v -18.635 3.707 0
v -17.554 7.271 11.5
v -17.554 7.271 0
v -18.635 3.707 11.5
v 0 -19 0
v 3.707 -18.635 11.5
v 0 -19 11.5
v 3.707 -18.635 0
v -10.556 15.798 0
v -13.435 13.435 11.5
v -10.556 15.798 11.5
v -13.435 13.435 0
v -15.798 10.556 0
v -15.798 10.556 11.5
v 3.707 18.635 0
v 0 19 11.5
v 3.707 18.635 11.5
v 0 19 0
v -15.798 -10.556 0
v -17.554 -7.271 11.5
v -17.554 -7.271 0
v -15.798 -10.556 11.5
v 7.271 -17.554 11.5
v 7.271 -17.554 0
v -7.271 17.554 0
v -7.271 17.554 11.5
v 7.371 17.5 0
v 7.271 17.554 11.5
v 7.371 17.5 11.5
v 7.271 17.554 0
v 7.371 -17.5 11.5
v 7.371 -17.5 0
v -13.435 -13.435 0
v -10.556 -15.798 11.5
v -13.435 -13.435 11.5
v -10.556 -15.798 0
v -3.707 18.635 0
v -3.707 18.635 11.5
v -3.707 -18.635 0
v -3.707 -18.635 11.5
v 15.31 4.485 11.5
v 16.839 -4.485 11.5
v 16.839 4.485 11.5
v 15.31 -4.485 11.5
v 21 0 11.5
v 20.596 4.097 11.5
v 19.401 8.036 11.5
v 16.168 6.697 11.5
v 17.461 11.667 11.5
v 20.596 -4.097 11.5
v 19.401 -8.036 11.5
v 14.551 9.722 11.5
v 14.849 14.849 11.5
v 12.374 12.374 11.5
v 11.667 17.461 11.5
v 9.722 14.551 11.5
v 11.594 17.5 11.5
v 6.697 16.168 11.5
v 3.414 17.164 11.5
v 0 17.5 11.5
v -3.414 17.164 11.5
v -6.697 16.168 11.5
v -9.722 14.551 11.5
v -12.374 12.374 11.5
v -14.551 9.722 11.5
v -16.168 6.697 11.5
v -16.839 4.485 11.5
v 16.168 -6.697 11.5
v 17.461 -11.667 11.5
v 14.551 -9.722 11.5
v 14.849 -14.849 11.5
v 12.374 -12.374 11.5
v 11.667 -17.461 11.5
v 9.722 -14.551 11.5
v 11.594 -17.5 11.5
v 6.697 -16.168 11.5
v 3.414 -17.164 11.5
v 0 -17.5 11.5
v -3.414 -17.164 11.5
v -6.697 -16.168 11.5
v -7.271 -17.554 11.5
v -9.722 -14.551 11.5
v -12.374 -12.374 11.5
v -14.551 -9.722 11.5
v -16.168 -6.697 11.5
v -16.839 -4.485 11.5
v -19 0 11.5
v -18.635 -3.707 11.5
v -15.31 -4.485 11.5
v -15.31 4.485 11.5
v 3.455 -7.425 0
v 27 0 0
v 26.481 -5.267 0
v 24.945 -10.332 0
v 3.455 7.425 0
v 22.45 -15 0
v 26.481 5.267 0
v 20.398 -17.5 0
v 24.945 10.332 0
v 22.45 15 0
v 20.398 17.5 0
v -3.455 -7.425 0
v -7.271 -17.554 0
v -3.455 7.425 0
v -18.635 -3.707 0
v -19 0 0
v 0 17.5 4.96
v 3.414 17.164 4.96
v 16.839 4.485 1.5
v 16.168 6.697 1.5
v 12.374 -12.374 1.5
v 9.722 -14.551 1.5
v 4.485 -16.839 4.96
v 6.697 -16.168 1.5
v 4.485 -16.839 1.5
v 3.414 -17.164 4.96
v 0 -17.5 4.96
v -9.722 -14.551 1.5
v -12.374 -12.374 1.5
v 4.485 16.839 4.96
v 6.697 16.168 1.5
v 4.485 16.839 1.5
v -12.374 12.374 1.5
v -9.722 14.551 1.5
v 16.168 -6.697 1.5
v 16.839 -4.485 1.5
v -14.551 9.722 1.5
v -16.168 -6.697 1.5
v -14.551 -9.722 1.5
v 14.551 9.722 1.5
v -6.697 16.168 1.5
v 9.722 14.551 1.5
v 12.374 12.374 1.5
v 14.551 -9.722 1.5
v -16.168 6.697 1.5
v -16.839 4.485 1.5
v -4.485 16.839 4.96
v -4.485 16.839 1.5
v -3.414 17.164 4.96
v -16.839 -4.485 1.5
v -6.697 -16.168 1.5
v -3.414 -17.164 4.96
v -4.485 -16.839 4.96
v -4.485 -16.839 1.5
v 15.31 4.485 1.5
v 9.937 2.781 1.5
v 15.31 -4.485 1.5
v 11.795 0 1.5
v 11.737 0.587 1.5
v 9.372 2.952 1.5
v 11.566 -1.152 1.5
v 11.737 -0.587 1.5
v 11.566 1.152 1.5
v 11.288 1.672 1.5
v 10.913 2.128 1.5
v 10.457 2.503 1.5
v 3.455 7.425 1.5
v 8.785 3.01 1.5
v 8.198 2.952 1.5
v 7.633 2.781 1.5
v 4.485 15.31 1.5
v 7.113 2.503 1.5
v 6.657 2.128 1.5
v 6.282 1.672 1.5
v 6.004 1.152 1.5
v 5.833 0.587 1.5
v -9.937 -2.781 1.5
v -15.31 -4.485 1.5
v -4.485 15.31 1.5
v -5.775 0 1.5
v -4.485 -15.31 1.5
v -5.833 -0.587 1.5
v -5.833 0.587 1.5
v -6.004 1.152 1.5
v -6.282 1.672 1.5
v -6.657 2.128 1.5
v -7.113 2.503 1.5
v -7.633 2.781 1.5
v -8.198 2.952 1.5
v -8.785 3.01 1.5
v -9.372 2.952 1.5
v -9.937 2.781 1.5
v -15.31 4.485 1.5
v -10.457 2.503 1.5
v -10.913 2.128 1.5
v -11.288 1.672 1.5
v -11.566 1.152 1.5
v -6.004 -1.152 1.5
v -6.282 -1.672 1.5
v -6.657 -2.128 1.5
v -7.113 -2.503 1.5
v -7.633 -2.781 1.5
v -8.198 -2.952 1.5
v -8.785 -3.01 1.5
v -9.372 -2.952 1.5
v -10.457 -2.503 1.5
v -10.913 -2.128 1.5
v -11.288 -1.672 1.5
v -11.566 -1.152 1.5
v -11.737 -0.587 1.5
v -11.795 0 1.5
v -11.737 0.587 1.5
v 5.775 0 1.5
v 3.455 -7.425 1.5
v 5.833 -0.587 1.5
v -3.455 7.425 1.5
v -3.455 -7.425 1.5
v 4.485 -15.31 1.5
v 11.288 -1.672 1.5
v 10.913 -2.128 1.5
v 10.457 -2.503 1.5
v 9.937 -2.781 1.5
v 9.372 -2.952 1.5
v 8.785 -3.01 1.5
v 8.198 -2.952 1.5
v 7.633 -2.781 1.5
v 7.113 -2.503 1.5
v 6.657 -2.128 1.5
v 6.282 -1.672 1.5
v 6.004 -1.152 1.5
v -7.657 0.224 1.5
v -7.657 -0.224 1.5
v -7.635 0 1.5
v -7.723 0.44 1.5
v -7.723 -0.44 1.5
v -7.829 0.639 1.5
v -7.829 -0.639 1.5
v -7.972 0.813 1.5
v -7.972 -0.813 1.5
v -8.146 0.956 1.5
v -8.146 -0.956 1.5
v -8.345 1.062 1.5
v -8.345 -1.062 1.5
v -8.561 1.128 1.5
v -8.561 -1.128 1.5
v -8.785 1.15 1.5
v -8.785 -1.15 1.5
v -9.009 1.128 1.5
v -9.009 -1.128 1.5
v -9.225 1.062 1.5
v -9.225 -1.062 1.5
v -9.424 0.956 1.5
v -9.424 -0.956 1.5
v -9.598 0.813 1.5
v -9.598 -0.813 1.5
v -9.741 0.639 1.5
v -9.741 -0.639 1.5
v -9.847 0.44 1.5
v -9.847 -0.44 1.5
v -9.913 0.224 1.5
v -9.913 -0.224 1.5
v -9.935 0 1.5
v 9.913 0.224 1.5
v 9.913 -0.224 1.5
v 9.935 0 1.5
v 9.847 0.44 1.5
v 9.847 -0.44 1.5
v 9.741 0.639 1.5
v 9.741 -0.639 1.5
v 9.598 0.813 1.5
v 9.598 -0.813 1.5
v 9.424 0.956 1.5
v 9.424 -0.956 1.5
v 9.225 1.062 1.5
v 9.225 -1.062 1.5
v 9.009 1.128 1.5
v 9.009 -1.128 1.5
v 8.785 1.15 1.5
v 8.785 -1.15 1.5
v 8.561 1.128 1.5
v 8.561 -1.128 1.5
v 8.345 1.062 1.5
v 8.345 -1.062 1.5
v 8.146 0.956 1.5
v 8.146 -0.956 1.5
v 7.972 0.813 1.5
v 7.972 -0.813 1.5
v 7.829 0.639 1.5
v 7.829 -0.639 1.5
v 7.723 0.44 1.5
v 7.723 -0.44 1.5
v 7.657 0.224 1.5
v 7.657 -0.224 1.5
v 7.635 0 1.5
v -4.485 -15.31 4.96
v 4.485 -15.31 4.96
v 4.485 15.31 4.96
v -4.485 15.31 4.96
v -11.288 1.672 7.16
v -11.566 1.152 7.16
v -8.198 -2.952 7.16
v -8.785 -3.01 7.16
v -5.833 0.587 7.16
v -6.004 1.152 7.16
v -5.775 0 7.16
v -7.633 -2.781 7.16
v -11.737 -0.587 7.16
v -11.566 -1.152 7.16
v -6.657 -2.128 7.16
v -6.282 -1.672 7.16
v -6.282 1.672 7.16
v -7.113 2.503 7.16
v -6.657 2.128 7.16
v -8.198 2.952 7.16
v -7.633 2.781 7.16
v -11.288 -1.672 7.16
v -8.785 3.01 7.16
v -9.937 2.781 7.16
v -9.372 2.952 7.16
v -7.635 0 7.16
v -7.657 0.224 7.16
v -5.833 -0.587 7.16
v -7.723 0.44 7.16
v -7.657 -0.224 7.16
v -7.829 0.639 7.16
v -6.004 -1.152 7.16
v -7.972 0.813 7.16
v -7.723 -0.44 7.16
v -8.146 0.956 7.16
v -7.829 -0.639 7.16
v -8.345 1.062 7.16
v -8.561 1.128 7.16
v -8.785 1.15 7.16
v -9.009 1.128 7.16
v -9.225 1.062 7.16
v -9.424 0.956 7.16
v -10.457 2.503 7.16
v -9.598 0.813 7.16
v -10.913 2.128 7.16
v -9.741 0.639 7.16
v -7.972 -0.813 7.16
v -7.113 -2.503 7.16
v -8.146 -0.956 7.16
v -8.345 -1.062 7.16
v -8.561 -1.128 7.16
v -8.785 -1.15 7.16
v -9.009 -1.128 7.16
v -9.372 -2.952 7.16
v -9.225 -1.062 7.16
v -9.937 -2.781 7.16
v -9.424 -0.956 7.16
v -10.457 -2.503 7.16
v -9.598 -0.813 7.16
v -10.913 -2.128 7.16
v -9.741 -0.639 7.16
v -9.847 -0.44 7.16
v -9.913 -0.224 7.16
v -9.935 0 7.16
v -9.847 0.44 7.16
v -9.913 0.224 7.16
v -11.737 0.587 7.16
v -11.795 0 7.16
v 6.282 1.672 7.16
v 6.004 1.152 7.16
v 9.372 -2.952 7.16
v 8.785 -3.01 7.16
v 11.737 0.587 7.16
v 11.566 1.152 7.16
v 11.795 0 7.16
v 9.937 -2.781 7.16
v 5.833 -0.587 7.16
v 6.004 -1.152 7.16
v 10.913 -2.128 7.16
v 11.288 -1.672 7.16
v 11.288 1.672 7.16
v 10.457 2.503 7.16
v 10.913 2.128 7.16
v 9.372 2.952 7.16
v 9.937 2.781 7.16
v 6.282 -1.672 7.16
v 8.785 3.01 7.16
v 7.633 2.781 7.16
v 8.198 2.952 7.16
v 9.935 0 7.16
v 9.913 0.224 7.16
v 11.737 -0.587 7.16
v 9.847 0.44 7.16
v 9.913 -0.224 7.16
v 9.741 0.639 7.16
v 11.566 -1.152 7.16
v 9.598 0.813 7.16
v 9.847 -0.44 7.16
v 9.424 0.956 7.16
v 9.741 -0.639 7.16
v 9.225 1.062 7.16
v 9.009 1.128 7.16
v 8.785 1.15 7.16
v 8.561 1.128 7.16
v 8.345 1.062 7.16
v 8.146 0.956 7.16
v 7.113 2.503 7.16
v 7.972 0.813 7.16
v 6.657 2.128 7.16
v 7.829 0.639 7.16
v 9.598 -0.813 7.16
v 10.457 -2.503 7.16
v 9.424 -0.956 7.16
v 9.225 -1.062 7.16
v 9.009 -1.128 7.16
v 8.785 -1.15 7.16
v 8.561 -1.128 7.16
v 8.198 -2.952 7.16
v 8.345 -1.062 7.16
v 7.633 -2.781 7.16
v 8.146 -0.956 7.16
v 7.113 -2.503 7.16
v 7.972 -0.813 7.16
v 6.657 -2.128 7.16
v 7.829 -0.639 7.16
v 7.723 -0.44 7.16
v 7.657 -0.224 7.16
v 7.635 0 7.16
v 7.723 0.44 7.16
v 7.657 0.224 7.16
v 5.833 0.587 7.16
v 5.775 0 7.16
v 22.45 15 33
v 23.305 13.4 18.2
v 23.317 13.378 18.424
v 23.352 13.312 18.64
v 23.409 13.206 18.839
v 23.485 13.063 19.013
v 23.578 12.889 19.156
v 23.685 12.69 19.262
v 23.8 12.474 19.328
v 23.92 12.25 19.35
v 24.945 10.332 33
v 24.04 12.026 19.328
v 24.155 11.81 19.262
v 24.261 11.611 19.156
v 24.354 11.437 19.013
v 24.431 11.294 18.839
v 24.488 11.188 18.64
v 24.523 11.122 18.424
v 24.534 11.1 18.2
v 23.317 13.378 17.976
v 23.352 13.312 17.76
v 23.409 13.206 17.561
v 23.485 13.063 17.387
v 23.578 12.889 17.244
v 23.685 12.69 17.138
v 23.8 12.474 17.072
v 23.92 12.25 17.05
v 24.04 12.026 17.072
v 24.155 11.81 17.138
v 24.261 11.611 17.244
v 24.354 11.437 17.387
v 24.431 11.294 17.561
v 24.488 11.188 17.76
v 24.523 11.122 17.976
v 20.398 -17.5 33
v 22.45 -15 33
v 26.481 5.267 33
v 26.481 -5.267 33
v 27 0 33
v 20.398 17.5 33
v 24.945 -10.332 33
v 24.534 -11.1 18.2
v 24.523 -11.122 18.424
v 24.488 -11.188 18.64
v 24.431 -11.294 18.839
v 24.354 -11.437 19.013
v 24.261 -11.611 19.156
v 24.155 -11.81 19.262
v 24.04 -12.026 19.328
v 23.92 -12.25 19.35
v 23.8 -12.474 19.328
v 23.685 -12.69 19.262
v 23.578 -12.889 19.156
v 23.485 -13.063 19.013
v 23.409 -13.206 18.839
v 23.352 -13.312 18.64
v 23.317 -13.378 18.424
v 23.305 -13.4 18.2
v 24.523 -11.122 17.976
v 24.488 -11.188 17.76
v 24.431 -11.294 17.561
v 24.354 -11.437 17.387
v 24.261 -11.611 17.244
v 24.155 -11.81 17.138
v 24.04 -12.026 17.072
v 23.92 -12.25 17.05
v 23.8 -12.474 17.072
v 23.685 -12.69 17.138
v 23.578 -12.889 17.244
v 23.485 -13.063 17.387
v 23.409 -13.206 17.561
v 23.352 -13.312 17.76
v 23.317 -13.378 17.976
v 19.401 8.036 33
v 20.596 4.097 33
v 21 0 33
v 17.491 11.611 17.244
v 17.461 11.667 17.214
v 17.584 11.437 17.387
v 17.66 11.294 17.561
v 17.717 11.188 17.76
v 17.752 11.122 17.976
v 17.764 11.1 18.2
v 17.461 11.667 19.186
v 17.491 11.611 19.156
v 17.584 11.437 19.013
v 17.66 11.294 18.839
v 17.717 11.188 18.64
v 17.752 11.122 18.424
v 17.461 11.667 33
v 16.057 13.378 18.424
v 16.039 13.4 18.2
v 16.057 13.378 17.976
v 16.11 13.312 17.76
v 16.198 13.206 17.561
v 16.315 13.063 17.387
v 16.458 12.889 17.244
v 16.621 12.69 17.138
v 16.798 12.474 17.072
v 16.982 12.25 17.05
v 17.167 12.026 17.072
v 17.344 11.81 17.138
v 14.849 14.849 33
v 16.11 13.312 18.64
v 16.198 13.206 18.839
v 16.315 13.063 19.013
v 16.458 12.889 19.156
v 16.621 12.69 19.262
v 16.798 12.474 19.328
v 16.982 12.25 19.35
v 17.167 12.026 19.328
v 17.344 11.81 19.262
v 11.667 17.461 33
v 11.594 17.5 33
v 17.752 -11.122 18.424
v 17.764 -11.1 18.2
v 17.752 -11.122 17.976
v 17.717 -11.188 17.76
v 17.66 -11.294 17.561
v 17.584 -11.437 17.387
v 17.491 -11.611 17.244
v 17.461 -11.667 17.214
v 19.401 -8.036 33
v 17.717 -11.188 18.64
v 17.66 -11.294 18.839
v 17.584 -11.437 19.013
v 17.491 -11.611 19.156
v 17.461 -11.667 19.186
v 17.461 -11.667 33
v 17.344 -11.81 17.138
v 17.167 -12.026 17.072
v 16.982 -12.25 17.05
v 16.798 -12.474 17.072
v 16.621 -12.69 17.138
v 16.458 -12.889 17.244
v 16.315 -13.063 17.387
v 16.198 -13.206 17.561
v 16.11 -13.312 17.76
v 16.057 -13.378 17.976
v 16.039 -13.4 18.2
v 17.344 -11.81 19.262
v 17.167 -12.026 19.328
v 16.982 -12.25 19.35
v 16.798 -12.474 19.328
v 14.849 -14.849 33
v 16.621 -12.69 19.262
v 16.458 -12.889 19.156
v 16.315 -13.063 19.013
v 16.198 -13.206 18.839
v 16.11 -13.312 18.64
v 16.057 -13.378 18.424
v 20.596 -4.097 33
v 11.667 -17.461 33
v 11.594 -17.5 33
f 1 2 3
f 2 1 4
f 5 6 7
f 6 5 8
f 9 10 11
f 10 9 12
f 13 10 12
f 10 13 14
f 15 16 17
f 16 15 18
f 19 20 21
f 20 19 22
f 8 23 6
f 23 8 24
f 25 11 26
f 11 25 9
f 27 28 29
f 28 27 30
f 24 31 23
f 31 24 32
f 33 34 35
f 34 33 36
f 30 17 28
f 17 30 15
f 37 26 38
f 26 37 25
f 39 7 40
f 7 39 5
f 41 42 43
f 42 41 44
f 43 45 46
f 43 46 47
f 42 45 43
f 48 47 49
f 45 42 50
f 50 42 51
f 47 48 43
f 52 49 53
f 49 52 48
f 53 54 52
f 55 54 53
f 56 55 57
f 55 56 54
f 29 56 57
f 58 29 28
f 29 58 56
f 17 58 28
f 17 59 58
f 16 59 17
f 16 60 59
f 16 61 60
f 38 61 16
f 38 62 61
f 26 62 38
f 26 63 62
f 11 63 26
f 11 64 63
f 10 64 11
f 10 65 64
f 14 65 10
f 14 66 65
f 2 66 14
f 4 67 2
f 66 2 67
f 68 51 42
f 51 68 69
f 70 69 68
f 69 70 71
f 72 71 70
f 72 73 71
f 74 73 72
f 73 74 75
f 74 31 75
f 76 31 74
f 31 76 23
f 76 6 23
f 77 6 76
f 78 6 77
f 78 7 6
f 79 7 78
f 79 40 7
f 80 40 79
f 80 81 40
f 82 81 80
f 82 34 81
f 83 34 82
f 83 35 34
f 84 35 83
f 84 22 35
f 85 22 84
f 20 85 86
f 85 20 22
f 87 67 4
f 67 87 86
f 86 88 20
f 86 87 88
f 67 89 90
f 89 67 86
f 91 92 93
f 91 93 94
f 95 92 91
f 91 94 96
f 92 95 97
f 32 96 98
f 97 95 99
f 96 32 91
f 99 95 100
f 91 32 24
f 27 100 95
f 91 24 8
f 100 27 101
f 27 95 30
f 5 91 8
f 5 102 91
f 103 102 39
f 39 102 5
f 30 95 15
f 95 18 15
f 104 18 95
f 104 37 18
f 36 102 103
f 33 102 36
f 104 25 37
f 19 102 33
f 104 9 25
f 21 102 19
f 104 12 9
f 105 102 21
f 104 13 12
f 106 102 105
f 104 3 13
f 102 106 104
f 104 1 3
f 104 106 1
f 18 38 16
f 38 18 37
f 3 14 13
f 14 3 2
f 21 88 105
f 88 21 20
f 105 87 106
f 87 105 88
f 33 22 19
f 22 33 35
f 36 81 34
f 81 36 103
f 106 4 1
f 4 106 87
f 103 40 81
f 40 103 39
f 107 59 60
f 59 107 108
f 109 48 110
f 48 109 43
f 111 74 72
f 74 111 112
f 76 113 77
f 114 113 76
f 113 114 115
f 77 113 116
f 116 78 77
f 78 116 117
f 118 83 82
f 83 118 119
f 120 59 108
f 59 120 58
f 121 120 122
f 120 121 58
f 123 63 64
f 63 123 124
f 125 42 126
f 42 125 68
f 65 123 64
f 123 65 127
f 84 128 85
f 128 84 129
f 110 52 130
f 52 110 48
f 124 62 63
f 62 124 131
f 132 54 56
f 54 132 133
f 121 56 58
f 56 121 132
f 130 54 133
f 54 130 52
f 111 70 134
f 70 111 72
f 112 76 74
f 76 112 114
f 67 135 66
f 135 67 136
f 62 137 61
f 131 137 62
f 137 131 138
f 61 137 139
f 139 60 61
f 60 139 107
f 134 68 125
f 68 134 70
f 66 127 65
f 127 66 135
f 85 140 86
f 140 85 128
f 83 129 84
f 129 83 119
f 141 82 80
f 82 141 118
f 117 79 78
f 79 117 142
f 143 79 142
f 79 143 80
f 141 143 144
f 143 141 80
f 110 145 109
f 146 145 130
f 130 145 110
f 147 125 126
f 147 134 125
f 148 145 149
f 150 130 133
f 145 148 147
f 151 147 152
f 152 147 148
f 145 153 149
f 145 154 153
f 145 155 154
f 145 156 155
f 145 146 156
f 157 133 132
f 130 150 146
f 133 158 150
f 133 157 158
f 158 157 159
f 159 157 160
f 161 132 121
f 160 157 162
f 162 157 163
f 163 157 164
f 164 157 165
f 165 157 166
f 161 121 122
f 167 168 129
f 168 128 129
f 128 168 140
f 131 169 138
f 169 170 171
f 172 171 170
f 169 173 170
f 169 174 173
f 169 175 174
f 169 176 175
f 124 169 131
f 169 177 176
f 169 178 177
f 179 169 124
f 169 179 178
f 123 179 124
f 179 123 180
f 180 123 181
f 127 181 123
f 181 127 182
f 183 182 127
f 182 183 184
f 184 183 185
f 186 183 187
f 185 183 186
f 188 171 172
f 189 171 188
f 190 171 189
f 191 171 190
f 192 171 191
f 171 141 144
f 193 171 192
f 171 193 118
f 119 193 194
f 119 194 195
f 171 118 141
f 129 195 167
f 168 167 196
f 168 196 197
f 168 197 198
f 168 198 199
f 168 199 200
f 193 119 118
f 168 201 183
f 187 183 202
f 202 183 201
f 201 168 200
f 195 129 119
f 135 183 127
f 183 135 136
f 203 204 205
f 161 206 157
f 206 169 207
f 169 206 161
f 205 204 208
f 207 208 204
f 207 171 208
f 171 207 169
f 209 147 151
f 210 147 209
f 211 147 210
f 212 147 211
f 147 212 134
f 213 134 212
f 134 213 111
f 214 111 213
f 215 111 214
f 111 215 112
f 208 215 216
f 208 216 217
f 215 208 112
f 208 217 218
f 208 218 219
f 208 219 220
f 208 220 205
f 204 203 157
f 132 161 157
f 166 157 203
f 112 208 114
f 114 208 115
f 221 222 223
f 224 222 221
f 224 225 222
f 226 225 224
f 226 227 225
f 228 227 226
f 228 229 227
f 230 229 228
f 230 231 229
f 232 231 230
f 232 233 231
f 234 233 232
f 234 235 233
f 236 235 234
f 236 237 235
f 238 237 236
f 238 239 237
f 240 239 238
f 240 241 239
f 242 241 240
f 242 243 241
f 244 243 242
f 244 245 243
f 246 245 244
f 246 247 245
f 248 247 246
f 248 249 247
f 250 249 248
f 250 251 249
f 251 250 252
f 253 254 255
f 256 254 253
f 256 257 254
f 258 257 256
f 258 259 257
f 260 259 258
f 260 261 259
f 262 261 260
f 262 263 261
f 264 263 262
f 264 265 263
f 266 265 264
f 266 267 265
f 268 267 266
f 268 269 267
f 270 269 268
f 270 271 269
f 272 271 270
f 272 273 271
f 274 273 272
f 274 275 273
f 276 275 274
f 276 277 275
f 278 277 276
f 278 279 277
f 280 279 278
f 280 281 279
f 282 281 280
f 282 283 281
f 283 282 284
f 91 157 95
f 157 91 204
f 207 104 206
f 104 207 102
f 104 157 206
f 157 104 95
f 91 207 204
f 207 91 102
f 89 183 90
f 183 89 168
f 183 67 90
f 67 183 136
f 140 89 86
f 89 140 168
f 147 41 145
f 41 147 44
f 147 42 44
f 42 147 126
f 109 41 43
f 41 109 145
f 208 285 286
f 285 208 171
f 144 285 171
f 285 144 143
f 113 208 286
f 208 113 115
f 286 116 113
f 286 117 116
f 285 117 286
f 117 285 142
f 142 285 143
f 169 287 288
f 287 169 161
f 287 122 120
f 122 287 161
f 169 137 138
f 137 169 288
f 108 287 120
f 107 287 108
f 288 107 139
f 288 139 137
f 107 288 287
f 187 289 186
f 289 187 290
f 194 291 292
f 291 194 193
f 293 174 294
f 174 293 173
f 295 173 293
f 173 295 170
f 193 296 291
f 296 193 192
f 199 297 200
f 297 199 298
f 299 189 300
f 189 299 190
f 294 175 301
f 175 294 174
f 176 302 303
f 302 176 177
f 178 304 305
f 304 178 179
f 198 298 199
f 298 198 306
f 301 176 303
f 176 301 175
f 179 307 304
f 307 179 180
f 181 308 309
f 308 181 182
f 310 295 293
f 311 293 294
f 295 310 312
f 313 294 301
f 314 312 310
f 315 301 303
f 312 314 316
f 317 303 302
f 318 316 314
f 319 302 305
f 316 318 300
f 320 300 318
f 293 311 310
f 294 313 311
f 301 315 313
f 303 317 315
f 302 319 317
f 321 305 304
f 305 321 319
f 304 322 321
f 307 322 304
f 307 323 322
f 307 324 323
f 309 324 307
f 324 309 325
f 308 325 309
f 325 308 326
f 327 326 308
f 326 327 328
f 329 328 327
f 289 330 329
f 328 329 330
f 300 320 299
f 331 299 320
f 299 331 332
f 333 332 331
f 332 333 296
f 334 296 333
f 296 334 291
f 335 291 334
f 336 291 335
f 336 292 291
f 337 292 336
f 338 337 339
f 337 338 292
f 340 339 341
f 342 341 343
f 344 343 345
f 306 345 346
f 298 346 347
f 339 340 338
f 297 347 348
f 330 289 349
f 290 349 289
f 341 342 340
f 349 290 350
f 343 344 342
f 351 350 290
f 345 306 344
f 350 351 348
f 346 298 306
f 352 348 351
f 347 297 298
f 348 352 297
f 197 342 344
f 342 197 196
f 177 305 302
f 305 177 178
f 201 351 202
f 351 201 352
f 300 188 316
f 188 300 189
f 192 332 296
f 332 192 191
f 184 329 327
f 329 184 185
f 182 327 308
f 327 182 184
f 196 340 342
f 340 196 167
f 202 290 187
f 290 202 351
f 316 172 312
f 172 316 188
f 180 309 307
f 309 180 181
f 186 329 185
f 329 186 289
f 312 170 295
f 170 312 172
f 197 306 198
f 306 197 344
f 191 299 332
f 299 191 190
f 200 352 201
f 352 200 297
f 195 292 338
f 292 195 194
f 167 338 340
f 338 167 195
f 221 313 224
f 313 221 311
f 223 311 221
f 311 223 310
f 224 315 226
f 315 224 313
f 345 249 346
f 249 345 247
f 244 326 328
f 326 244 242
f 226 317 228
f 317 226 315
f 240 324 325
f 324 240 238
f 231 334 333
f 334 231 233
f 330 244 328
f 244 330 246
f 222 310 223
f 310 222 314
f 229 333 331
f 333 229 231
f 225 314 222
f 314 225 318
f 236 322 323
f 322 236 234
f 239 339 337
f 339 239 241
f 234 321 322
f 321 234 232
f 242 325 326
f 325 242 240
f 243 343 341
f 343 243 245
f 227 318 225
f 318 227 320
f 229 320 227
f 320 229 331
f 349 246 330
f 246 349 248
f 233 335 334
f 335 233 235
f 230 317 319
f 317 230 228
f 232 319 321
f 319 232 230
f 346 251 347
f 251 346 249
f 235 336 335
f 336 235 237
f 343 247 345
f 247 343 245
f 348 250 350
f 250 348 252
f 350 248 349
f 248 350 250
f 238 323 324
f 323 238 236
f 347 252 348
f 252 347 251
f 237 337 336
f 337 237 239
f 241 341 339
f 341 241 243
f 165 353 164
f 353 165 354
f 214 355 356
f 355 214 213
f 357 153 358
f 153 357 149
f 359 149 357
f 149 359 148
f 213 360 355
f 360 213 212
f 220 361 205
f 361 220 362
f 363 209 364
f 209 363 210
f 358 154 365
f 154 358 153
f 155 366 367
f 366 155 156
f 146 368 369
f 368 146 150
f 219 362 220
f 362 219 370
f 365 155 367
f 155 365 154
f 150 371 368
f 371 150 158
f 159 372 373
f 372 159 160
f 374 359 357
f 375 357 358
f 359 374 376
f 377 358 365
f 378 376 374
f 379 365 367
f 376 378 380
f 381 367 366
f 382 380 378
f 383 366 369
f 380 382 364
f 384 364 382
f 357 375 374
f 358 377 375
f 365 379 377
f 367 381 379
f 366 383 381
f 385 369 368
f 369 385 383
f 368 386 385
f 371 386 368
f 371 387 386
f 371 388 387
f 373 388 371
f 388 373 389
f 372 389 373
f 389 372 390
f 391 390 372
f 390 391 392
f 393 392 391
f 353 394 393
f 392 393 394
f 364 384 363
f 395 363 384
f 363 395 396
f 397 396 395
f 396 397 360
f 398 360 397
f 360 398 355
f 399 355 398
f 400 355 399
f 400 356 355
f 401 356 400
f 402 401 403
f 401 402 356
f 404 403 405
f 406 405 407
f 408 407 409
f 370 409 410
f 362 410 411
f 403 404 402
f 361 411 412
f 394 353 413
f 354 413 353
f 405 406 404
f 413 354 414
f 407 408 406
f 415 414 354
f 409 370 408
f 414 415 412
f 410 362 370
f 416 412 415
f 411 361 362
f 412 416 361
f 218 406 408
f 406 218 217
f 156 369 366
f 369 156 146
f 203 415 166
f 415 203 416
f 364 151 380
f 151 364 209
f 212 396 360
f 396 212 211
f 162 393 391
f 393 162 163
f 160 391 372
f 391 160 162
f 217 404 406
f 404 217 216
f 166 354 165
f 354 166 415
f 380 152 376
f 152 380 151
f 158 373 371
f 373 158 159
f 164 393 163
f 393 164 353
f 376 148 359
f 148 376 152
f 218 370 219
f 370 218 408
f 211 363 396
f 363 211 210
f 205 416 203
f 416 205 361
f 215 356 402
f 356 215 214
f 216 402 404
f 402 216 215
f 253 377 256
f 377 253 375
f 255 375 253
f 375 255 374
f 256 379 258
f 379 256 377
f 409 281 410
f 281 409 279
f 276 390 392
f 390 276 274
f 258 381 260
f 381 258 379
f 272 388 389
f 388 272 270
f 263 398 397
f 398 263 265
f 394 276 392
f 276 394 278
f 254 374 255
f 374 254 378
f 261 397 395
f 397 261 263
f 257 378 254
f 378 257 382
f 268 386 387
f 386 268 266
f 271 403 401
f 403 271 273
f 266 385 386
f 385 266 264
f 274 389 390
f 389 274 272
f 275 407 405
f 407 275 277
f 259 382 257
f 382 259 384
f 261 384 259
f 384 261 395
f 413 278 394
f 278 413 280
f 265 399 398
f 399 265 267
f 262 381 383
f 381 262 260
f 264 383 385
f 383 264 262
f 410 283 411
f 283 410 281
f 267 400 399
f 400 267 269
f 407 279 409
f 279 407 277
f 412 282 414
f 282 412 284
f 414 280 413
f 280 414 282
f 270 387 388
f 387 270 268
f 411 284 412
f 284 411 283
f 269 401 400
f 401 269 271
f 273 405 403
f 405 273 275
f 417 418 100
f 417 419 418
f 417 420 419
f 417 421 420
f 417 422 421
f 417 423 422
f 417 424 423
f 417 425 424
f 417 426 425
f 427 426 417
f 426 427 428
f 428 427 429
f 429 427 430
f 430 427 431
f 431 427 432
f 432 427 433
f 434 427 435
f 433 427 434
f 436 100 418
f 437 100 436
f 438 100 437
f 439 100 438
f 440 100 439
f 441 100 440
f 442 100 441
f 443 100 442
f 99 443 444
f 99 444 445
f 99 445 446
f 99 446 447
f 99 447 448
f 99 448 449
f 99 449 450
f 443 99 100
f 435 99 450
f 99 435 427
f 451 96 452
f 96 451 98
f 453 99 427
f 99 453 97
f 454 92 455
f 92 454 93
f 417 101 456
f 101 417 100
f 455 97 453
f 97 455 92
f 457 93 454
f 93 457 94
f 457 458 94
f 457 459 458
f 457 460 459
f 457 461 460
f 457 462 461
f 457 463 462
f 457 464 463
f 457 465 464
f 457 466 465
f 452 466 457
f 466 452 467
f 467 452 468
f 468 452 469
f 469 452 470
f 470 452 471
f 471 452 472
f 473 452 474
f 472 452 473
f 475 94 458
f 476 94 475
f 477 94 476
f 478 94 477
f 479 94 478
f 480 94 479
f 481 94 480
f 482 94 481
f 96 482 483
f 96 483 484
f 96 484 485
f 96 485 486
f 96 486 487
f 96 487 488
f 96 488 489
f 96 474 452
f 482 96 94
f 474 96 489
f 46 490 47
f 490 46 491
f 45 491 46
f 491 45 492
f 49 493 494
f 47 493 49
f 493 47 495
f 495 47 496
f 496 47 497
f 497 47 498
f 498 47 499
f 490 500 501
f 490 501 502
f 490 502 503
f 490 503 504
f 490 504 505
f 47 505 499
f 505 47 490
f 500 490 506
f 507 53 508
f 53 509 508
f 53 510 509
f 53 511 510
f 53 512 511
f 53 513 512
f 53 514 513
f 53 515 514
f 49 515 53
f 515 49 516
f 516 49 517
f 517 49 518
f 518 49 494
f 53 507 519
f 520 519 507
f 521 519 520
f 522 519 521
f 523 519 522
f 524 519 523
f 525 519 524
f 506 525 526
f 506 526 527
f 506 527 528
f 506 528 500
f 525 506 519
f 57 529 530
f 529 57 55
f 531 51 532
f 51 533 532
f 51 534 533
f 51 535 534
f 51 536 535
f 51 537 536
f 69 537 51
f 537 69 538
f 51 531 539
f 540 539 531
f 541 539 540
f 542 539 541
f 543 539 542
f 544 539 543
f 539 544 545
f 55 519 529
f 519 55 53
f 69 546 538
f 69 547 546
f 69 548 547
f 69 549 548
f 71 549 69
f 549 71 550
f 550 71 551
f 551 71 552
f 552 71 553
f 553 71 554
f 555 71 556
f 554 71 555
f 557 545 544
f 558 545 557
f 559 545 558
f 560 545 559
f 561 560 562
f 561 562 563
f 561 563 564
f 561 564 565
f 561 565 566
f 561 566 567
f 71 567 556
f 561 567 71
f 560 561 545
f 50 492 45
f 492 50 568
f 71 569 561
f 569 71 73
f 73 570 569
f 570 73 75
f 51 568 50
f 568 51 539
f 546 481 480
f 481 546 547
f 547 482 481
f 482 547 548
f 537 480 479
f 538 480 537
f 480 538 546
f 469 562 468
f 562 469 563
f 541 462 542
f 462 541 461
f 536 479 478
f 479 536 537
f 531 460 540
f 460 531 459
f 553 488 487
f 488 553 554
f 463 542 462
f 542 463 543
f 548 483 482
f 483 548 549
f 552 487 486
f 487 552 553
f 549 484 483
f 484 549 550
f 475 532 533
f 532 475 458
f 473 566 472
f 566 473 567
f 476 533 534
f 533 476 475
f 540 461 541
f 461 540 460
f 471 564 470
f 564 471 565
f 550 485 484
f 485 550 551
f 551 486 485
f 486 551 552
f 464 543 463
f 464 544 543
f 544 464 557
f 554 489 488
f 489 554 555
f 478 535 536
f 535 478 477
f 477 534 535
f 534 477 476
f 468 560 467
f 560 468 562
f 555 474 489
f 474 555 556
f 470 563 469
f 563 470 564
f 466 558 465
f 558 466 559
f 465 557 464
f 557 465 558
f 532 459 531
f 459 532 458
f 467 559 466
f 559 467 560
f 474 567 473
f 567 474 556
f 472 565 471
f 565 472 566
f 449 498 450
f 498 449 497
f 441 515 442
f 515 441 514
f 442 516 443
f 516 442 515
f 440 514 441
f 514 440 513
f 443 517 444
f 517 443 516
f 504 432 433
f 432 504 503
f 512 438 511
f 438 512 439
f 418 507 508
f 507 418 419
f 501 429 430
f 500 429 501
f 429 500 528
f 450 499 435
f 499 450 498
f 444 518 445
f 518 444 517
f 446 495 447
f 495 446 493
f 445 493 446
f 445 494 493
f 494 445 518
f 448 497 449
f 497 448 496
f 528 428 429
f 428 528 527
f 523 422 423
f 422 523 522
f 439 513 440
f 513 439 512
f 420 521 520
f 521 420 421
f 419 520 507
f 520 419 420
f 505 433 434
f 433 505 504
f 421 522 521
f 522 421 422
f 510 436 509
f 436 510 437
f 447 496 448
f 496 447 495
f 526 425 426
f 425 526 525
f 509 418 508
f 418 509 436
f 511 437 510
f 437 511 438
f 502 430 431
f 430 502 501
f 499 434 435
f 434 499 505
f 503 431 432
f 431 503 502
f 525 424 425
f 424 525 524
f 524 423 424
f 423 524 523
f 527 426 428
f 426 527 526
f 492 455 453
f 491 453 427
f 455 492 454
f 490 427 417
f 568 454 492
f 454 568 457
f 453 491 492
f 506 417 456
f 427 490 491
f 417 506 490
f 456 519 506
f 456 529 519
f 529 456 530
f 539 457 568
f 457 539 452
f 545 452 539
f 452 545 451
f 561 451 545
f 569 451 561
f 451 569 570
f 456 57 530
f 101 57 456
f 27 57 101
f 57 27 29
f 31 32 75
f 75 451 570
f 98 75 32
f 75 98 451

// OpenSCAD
holder_d = 54;
inner_d = 35;
thickness = 1.5;
groove = [2.19 + thickness, 8.97];
depth = 10;
bolt_d = 2.3;
bolt_h = 5.66;
holder_height = 31.5;

$fn = 32;

socket_holder();
intersection() {
  holder();
  holder_glue();
}
intersection() {
  holder_glue();
  difference() {
    cylinder(d = holder_d, h = thickness + depth);
    translate([0, 0, -1])
      cylinder(d = inner_d, h = thickness + depth + 2);
  }
}

module holder_glue() {
  translate([0, -35 / 2 , 0])
    cube([inner_d, 35, holder_height + thickness]);
}

module holder() {
  h = holder_height;
  bolt_distance = 24.5;
  holder_thickness = thickness * 4;

  difference() {
    difference() {
      cylinder(d = holder_d, h = h + holder_thickness);
      translate([0, 0, -1])
        cylinder(d = holder_d - (holder_thickness * 2), h = h + holder_thickness + 2);
    }

    translate([0, -bolt_distance / 2, 18.2])
      rotate([0, 90, 0]) {
        cylinder(d = bolt_d, h = holder_d);
        translate([0, bolt_distance, 0])
          cylinder(d = bolt_d, h = holder_d);
      }
  }
}

module socket_holder() {
  bolt_distance = 17.57;
  cable_hole = [6.91, 14.85];

  // ring with base
  difference() {
    union() {
      difference() {
        cylinder(h = thickness + depth, d = inner_d + (thickness * 2));
        translate([0, 0, -1])
          cylinder(h = thickness + depth + 2, d = inner_d);
      }
      cylinder(h = thickness, d = inner_d);
    }
    
    // cable hole
    translate([-cable_hole[0] / 2, -cable_hole[1] / 2, -1])
      cube([cable_hole[0], cable_hole[1], thickness + 2]);
  }

  // socket grooves
  intersection() {
    translate([-thickness - (inner_d / 2), -groove[1] / 2, 0])
      cube([groove[0], groove[1], depth + thickness]);
    cylinder(h = thickness + depth, d = inner_d + thickness * 2);
  }
  rotate([0, 0, 180])
    intersection() {
      translate([-thickness - (inner_d / 2), -groove[1] / 2, 0])
        cube([groove[0], groove[1], depth + thickness]);
      cylinder(h = thickness + depth, d = inner_d + thickness * 2);
    }
  
  // stability grooves
  rotate([0, 0, 90])
    intersection() {
      translate([-thickness - (inner_d / 2), -groove[1] / 2, 0])
        cube([groove[0], groove[1], depth + thickness]);
      cylinder(h = thickness + bolt_h - 2.2, d = inner_d + thickness * 2);
    }
  rotate([0, 0, -90])
    intersection() {
      translate([-thickness - (inner_d / 2), -groove[1] / 2, 0])
        cube([groove[0], groove[1], depth + thickness]);
      cylinder(h = thickness + bolt_h - 2.2, d = inner_d + thickness * 2);
    }

  // bolt holes
  translate([-bolt_distance / 2, 0, thickness]) {
    bolt_thingy();
    translate([bolt_distance, 0, 0])
      bolt_thingy();
  }
}

module bolt_thingy() {
  h = bolt_h;
  difference() {
    cylinder(h = h, d = 6.02);
    translate([0, 0, -1])
      cylinder(h = h + 2, d = bolt_d);
  }
}
